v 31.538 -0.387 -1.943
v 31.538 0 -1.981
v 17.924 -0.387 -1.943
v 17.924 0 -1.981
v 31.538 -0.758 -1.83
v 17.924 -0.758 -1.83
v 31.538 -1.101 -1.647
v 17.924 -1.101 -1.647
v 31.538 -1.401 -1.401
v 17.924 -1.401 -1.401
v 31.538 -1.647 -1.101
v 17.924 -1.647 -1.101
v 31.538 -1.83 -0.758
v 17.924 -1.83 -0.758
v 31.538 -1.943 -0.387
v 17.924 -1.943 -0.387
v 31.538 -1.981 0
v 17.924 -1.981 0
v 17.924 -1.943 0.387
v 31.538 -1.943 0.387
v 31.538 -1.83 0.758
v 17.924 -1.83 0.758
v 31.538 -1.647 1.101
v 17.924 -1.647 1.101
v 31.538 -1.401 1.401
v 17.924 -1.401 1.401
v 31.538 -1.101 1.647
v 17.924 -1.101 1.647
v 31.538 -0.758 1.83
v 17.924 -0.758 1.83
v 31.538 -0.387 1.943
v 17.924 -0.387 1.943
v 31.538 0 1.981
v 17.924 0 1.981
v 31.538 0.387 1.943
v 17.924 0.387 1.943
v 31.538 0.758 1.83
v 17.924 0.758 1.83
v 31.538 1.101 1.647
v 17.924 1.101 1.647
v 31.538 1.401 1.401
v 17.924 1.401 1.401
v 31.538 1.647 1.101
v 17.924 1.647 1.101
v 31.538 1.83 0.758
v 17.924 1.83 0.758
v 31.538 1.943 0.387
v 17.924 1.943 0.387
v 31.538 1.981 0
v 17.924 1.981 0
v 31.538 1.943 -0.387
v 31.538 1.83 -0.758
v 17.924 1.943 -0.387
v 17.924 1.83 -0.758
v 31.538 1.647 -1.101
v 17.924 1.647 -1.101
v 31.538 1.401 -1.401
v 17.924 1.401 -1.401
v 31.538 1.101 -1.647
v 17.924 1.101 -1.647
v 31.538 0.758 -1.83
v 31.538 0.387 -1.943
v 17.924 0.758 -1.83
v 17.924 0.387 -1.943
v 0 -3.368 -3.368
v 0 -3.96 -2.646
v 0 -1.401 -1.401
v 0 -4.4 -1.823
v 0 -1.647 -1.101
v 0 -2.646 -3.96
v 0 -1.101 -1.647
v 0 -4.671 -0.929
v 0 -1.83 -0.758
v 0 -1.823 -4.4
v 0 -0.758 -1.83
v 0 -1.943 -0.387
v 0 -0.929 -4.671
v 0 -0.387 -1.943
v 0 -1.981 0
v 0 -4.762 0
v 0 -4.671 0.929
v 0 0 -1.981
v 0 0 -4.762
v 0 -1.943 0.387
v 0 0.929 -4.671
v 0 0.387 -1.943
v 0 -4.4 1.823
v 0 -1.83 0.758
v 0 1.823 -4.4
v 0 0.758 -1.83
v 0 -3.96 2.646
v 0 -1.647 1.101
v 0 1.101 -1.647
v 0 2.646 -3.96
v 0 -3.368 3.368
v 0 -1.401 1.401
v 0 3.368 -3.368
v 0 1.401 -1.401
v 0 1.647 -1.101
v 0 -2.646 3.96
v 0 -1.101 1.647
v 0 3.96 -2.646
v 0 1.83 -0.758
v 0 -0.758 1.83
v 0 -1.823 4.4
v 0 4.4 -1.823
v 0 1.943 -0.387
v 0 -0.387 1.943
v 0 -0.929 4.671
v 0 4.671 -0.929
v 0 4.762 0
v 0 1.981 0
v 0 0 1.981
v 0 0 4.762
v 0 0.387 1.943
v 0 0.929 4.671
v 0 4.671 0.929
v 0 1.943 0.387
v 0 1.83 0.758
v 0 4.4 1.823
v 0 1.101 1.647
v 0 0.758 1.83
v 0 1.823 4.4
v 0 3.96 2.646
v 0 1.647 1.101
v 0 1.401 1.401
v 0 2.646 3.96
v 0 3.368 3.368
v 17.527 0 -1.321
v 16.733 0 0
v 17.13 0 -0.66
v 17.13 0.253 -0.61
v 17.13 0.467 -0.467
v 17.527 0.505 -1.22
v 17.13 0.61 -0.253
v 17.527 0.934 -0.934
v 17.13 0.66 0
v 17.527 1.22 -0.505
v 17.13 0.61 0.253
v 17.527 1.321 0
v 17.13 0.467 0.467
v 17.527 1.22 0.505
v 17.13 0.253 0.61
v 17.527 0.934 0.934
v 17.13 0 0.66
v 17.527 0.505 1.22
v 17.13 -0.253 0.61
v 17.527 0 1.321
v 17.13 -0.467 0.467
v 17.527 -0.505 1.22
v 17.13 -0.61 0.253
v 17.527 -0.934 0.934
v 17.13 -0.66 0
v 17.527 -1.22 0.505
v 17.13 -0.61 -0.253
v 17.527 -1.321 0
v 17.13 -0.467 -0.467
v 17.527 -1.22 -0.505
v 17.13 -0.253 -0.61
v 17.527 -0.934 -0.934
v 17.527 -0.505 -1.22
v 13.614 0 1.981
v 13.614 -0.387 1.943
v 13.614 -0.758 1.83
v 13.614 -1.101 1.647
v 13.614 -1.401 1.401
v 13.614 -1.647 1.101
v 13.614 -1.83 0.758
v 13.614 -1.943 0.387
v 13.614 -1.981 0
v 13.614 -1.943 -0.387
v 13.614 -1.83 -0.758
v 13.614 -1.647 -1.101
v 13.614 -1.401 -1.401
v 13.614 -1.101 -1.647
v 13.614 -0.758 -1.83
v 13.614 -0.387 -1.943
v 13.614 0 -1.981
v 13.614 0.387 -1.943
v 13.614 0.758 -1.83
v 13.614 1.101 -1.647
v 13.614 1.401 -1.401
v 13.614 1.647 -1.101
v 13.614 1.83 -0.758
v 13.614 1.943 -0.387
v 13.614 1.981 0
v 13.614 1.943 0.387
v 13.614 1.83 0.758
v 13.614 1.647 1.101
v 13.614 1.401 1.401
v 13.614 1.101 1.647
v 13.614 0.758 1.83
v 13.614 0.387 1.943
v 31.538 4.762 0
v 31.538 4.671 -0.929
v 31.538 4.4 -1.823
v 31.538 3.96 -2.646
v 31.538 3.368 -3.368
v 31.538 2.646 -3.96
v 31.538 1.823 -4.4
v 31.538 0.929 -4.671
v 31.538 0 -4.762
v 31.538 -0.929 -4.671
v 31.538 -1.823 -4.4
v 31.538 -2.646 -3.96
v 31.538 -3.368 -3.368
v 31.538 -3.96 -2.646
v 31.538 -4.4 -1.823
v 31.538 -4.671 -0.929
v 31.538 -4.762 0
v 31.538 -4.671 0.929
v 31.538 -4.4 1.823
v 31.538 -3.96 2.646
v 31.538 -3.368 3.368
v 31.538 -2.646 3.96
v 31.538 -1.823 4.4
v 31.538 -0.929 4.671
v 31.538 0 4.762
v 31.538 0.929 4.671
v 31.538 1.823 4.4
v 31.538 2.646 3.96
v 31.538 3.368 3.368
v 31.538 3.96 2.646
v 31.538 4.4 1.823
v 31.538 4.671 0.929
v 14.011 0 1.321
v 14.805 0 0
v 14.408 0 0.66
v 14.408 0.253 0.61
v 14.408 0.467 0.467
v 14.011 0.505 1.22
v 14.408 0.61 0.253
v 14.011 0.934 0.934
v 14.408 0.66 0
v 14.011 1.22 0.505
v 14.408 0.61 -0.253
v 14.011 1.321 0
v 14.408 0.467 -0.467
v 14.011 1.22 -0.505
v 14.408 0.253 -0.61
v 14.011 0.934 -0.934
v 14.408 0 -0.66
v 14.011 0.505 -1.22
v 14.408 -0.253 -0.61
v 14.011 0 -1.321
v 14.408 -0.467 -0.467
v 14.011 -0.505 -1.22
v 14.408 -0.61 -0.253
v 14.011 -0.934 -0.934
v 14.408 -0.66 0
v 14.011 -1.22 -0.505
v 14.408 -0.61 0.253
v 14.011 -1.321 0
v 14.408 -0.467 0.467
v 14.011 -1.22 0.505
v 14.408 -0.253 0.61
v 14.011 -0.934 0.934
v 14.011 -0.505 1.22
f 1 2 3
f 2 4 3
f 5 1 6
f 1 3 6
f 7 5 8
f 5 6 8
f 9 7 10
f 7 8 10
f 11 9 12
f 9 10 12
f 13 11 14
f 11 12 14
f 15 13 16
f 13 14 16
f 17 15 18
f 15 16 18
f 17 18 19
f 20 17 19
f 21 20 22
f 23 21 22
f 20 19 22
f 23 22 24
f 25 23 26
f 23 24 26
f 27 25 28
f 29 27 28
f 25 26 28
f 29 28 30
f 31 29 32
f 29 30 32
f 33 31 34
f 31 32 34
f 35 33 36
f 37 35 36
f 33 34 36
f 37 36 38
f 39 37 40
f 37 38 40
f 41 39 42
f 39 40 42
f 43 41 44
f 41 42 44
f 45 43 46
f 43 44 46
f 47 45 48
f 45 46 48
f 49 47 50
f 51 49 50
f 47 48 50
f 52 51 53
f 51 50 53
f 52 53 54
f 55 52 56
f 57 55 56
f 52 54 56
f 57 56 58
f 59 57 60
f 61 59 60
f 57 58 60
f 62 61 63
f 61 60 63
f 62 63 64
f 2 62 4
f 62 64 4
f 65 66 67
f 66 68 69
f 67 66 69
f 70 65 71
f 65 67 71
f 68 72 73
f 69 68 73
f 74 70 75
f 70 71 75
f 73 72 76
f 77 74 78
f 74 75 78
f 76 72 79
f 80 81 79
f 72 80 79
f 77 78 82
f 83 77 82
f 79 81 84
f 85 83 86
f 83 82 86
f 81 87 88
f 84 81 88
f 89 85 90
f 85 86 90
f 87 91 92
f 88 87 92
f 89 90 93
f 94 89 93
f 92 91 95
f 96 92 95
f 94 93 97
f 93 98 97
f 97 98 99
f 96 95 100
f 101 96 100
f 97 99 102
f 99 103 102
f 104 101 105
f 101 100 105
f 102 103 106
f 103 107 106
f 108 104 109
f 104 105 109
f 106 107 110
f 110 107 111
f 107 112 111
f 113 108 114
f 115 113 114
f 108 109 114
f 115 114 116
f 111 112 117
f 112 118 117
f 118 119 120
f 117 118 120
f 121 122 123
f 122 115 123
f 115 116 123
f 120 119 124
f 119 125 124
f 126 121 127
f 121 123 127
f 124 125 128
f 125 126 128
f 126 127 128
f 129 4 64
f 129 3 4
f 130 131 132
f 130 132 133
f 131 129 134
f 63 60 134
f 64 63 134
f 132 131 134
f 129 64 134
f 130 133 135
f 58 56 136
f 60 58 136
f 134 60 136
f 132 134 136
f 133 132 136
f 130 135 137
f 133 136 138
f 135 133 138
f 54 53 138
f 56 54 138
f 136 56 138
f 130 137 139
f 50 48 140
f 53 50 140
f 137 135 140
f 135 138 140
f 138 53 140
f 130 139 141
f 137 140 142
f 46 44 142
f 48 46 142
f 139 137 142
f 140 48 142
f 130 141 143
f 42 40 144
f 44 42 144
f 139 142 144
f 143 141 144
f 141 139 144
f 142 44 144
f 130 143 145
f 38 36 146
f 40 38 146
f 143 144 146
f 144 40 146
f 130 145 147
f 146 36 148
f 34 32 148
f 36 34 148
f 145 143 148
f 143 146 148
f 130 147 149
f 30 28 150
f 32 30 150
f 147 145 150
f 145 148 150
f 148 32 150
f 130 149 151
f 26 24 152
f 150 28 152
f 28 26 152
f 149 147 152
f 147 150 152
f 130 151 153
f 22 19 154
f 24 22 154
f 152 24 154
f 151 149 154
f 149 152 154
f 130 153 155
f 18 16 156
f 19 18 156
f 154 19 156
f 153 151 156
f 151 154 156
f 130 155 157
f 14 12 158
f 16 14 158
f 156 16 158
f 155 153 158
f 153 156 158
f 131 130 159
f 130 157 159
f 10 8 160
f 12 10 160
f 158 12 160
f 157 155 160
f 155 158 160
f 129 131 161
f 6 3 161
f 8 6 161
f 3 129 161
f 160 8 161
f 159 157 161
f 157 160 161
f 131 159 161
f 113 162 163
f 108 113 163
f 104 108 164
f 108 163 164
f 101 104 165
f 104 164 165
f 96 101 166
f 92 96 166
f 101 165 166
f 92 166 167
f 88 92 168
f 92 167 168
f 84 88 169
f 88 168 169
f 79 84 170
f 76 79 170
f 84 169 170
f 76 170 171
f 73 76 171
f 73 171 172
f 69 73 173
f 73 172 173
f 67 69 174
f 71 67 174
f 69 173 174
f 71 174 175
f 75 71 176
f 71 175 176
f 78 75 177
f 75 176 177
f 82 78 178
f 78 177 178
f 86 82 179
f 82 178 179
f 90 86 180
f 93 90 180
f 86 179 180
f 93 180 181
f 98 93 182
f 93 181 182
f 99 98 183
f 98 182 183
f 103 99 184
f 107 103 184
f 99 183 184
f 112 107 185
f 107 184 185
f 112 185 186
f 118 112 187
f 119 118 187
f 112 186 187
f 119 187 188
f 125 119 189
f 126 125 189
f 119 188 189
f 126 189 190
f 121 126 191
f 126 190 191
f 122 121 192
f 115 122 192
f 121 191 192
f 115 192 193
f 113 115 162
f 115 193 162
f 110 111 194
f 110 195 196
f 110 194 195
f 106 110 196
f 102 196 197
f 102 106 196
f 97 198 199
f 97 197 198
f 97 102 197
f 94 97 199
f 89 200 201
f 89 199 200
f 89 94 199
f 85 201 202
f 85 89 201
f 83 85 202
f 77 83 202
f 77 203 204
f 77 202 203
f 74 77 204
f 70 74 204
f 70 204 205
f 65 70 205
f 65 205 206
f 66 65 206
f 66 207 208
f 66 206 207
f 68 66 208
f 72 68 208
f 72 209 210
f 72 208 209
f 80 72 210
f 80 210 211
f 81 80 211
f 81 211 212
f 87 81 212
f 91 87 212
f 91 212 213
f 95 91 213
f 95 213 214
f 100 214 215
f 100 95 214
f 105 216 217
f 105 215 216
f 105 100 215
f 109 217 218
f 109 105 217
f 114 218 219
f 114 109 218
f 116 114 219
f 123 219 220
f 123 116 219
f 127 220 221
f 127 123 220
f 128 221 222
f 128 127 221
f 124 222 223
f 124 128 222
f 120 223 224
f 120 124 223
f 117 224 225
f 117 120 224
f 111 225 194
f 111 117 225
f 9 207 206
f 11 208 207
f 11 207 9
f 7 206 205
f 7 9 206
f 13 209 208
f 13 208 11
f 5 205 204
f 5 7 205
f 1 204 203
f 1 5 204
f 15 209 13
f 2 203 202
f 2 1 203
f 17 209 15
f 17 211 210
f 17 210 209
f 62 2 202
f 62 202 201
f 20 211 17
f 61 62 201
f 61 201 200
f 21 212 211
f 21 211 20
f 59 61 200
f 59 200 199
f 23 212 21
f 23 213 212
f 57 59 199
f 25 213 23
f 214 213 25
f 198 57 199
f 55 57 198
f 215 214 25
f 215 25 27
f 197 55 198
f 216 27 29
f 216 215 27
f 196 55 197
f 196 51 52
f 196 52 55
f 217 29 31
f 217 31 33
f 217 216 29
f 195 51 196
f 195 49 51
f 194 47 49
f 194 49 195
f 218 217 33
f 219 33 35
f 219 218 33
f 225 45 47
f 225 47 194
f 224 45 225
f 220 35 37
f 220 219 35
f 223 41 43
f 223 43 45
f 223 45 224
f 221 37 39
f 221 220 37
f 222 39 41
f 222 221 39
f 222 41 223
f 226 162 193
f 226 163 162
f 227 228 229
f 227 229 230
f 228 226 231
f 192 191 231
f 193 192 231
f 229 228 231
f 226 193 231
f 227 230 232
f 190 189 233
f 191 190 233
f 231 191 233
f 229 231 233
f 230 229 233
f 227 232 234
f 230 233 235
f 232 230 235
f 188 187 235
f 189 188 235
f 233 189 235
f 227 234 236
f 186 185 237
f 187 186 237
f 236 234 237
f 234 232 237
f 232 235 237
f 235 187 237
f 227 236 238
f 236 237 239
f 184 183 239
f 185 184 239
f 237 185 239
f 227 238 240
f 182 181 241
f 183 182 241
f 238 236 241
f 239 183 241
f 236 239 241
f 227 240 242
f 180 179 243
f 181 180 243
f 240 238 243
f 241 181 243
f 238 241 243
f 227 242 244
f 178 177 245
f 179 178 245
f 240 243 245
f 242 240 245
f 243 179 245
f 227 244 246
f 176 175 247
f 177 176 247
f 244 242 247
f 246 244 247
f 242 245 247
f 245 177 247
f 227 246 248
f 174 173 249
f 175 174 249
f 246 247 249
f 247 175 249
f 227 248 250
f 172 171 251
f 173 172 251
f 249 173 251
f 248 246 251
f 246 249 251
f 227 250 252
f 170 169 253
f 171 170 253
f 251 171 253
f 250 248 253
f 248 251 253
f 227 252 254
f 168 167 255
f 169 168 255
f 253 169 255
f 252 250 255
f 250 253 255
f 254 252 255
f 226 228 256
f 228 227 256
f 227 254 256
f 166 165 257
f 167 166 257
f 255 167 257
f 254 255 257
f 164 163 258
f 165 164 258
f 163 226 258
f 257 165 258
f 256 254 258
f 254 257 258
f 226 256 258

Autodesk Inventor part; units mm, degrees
ref_plane "YZ Plane" through (0, 0, 0) normal (1, 0, 0) x (0, 1, 0)
ref_plane "XZ Plane" through (0, 0, 0) normal (0, 1, 0) x (-1, 0, 0)
ref_plane "XY Plane" through (0, 0, 0) normal (0, 0, 1) x (1, 0, 0)
sketch "Sketch1" plane through (0, 0, 0) normal (1, 0, 0) x (0, 1, 0)
  circle A0 centre (0, 0) radius 4.7625
  dimension "d0" = 9.525
extrude "Extrusion1" add sketch "Sketch1" along normal blind 31.5379
sketch "Sketch2" plane through (31.5379, 0, 0) normal (1, 0, 0) x (0, 0, -1)
  point P0 (0, 0)
  point P1 (0, 0)
hole "Hole1" at (31.5379, 0, 0) direction (-1, 0, 0) diameter 3.9624 depth 13.6144 tip angle 118 thread size "10-32 UNF" class "2B" standard "ANSI Unified Screw Threads"
sketch "Sketch3" plane through (0, 0, 0) normal (-1, 0, 0) x (0, 0, 1)
  point P0 (0, 0)
  point P1 (0, 0)
hole "Hole2" at (0, 0, 0) direction (1, 0, 0) diameter 3.9624 depth 13.6144 tip angle 118 thread size "10-32 UNF" class "2B" standard "ANSI Unified Screw Threads"
properties part number "STOCK,REVERSER,STANDOFF" material "Aluminum 6061"
